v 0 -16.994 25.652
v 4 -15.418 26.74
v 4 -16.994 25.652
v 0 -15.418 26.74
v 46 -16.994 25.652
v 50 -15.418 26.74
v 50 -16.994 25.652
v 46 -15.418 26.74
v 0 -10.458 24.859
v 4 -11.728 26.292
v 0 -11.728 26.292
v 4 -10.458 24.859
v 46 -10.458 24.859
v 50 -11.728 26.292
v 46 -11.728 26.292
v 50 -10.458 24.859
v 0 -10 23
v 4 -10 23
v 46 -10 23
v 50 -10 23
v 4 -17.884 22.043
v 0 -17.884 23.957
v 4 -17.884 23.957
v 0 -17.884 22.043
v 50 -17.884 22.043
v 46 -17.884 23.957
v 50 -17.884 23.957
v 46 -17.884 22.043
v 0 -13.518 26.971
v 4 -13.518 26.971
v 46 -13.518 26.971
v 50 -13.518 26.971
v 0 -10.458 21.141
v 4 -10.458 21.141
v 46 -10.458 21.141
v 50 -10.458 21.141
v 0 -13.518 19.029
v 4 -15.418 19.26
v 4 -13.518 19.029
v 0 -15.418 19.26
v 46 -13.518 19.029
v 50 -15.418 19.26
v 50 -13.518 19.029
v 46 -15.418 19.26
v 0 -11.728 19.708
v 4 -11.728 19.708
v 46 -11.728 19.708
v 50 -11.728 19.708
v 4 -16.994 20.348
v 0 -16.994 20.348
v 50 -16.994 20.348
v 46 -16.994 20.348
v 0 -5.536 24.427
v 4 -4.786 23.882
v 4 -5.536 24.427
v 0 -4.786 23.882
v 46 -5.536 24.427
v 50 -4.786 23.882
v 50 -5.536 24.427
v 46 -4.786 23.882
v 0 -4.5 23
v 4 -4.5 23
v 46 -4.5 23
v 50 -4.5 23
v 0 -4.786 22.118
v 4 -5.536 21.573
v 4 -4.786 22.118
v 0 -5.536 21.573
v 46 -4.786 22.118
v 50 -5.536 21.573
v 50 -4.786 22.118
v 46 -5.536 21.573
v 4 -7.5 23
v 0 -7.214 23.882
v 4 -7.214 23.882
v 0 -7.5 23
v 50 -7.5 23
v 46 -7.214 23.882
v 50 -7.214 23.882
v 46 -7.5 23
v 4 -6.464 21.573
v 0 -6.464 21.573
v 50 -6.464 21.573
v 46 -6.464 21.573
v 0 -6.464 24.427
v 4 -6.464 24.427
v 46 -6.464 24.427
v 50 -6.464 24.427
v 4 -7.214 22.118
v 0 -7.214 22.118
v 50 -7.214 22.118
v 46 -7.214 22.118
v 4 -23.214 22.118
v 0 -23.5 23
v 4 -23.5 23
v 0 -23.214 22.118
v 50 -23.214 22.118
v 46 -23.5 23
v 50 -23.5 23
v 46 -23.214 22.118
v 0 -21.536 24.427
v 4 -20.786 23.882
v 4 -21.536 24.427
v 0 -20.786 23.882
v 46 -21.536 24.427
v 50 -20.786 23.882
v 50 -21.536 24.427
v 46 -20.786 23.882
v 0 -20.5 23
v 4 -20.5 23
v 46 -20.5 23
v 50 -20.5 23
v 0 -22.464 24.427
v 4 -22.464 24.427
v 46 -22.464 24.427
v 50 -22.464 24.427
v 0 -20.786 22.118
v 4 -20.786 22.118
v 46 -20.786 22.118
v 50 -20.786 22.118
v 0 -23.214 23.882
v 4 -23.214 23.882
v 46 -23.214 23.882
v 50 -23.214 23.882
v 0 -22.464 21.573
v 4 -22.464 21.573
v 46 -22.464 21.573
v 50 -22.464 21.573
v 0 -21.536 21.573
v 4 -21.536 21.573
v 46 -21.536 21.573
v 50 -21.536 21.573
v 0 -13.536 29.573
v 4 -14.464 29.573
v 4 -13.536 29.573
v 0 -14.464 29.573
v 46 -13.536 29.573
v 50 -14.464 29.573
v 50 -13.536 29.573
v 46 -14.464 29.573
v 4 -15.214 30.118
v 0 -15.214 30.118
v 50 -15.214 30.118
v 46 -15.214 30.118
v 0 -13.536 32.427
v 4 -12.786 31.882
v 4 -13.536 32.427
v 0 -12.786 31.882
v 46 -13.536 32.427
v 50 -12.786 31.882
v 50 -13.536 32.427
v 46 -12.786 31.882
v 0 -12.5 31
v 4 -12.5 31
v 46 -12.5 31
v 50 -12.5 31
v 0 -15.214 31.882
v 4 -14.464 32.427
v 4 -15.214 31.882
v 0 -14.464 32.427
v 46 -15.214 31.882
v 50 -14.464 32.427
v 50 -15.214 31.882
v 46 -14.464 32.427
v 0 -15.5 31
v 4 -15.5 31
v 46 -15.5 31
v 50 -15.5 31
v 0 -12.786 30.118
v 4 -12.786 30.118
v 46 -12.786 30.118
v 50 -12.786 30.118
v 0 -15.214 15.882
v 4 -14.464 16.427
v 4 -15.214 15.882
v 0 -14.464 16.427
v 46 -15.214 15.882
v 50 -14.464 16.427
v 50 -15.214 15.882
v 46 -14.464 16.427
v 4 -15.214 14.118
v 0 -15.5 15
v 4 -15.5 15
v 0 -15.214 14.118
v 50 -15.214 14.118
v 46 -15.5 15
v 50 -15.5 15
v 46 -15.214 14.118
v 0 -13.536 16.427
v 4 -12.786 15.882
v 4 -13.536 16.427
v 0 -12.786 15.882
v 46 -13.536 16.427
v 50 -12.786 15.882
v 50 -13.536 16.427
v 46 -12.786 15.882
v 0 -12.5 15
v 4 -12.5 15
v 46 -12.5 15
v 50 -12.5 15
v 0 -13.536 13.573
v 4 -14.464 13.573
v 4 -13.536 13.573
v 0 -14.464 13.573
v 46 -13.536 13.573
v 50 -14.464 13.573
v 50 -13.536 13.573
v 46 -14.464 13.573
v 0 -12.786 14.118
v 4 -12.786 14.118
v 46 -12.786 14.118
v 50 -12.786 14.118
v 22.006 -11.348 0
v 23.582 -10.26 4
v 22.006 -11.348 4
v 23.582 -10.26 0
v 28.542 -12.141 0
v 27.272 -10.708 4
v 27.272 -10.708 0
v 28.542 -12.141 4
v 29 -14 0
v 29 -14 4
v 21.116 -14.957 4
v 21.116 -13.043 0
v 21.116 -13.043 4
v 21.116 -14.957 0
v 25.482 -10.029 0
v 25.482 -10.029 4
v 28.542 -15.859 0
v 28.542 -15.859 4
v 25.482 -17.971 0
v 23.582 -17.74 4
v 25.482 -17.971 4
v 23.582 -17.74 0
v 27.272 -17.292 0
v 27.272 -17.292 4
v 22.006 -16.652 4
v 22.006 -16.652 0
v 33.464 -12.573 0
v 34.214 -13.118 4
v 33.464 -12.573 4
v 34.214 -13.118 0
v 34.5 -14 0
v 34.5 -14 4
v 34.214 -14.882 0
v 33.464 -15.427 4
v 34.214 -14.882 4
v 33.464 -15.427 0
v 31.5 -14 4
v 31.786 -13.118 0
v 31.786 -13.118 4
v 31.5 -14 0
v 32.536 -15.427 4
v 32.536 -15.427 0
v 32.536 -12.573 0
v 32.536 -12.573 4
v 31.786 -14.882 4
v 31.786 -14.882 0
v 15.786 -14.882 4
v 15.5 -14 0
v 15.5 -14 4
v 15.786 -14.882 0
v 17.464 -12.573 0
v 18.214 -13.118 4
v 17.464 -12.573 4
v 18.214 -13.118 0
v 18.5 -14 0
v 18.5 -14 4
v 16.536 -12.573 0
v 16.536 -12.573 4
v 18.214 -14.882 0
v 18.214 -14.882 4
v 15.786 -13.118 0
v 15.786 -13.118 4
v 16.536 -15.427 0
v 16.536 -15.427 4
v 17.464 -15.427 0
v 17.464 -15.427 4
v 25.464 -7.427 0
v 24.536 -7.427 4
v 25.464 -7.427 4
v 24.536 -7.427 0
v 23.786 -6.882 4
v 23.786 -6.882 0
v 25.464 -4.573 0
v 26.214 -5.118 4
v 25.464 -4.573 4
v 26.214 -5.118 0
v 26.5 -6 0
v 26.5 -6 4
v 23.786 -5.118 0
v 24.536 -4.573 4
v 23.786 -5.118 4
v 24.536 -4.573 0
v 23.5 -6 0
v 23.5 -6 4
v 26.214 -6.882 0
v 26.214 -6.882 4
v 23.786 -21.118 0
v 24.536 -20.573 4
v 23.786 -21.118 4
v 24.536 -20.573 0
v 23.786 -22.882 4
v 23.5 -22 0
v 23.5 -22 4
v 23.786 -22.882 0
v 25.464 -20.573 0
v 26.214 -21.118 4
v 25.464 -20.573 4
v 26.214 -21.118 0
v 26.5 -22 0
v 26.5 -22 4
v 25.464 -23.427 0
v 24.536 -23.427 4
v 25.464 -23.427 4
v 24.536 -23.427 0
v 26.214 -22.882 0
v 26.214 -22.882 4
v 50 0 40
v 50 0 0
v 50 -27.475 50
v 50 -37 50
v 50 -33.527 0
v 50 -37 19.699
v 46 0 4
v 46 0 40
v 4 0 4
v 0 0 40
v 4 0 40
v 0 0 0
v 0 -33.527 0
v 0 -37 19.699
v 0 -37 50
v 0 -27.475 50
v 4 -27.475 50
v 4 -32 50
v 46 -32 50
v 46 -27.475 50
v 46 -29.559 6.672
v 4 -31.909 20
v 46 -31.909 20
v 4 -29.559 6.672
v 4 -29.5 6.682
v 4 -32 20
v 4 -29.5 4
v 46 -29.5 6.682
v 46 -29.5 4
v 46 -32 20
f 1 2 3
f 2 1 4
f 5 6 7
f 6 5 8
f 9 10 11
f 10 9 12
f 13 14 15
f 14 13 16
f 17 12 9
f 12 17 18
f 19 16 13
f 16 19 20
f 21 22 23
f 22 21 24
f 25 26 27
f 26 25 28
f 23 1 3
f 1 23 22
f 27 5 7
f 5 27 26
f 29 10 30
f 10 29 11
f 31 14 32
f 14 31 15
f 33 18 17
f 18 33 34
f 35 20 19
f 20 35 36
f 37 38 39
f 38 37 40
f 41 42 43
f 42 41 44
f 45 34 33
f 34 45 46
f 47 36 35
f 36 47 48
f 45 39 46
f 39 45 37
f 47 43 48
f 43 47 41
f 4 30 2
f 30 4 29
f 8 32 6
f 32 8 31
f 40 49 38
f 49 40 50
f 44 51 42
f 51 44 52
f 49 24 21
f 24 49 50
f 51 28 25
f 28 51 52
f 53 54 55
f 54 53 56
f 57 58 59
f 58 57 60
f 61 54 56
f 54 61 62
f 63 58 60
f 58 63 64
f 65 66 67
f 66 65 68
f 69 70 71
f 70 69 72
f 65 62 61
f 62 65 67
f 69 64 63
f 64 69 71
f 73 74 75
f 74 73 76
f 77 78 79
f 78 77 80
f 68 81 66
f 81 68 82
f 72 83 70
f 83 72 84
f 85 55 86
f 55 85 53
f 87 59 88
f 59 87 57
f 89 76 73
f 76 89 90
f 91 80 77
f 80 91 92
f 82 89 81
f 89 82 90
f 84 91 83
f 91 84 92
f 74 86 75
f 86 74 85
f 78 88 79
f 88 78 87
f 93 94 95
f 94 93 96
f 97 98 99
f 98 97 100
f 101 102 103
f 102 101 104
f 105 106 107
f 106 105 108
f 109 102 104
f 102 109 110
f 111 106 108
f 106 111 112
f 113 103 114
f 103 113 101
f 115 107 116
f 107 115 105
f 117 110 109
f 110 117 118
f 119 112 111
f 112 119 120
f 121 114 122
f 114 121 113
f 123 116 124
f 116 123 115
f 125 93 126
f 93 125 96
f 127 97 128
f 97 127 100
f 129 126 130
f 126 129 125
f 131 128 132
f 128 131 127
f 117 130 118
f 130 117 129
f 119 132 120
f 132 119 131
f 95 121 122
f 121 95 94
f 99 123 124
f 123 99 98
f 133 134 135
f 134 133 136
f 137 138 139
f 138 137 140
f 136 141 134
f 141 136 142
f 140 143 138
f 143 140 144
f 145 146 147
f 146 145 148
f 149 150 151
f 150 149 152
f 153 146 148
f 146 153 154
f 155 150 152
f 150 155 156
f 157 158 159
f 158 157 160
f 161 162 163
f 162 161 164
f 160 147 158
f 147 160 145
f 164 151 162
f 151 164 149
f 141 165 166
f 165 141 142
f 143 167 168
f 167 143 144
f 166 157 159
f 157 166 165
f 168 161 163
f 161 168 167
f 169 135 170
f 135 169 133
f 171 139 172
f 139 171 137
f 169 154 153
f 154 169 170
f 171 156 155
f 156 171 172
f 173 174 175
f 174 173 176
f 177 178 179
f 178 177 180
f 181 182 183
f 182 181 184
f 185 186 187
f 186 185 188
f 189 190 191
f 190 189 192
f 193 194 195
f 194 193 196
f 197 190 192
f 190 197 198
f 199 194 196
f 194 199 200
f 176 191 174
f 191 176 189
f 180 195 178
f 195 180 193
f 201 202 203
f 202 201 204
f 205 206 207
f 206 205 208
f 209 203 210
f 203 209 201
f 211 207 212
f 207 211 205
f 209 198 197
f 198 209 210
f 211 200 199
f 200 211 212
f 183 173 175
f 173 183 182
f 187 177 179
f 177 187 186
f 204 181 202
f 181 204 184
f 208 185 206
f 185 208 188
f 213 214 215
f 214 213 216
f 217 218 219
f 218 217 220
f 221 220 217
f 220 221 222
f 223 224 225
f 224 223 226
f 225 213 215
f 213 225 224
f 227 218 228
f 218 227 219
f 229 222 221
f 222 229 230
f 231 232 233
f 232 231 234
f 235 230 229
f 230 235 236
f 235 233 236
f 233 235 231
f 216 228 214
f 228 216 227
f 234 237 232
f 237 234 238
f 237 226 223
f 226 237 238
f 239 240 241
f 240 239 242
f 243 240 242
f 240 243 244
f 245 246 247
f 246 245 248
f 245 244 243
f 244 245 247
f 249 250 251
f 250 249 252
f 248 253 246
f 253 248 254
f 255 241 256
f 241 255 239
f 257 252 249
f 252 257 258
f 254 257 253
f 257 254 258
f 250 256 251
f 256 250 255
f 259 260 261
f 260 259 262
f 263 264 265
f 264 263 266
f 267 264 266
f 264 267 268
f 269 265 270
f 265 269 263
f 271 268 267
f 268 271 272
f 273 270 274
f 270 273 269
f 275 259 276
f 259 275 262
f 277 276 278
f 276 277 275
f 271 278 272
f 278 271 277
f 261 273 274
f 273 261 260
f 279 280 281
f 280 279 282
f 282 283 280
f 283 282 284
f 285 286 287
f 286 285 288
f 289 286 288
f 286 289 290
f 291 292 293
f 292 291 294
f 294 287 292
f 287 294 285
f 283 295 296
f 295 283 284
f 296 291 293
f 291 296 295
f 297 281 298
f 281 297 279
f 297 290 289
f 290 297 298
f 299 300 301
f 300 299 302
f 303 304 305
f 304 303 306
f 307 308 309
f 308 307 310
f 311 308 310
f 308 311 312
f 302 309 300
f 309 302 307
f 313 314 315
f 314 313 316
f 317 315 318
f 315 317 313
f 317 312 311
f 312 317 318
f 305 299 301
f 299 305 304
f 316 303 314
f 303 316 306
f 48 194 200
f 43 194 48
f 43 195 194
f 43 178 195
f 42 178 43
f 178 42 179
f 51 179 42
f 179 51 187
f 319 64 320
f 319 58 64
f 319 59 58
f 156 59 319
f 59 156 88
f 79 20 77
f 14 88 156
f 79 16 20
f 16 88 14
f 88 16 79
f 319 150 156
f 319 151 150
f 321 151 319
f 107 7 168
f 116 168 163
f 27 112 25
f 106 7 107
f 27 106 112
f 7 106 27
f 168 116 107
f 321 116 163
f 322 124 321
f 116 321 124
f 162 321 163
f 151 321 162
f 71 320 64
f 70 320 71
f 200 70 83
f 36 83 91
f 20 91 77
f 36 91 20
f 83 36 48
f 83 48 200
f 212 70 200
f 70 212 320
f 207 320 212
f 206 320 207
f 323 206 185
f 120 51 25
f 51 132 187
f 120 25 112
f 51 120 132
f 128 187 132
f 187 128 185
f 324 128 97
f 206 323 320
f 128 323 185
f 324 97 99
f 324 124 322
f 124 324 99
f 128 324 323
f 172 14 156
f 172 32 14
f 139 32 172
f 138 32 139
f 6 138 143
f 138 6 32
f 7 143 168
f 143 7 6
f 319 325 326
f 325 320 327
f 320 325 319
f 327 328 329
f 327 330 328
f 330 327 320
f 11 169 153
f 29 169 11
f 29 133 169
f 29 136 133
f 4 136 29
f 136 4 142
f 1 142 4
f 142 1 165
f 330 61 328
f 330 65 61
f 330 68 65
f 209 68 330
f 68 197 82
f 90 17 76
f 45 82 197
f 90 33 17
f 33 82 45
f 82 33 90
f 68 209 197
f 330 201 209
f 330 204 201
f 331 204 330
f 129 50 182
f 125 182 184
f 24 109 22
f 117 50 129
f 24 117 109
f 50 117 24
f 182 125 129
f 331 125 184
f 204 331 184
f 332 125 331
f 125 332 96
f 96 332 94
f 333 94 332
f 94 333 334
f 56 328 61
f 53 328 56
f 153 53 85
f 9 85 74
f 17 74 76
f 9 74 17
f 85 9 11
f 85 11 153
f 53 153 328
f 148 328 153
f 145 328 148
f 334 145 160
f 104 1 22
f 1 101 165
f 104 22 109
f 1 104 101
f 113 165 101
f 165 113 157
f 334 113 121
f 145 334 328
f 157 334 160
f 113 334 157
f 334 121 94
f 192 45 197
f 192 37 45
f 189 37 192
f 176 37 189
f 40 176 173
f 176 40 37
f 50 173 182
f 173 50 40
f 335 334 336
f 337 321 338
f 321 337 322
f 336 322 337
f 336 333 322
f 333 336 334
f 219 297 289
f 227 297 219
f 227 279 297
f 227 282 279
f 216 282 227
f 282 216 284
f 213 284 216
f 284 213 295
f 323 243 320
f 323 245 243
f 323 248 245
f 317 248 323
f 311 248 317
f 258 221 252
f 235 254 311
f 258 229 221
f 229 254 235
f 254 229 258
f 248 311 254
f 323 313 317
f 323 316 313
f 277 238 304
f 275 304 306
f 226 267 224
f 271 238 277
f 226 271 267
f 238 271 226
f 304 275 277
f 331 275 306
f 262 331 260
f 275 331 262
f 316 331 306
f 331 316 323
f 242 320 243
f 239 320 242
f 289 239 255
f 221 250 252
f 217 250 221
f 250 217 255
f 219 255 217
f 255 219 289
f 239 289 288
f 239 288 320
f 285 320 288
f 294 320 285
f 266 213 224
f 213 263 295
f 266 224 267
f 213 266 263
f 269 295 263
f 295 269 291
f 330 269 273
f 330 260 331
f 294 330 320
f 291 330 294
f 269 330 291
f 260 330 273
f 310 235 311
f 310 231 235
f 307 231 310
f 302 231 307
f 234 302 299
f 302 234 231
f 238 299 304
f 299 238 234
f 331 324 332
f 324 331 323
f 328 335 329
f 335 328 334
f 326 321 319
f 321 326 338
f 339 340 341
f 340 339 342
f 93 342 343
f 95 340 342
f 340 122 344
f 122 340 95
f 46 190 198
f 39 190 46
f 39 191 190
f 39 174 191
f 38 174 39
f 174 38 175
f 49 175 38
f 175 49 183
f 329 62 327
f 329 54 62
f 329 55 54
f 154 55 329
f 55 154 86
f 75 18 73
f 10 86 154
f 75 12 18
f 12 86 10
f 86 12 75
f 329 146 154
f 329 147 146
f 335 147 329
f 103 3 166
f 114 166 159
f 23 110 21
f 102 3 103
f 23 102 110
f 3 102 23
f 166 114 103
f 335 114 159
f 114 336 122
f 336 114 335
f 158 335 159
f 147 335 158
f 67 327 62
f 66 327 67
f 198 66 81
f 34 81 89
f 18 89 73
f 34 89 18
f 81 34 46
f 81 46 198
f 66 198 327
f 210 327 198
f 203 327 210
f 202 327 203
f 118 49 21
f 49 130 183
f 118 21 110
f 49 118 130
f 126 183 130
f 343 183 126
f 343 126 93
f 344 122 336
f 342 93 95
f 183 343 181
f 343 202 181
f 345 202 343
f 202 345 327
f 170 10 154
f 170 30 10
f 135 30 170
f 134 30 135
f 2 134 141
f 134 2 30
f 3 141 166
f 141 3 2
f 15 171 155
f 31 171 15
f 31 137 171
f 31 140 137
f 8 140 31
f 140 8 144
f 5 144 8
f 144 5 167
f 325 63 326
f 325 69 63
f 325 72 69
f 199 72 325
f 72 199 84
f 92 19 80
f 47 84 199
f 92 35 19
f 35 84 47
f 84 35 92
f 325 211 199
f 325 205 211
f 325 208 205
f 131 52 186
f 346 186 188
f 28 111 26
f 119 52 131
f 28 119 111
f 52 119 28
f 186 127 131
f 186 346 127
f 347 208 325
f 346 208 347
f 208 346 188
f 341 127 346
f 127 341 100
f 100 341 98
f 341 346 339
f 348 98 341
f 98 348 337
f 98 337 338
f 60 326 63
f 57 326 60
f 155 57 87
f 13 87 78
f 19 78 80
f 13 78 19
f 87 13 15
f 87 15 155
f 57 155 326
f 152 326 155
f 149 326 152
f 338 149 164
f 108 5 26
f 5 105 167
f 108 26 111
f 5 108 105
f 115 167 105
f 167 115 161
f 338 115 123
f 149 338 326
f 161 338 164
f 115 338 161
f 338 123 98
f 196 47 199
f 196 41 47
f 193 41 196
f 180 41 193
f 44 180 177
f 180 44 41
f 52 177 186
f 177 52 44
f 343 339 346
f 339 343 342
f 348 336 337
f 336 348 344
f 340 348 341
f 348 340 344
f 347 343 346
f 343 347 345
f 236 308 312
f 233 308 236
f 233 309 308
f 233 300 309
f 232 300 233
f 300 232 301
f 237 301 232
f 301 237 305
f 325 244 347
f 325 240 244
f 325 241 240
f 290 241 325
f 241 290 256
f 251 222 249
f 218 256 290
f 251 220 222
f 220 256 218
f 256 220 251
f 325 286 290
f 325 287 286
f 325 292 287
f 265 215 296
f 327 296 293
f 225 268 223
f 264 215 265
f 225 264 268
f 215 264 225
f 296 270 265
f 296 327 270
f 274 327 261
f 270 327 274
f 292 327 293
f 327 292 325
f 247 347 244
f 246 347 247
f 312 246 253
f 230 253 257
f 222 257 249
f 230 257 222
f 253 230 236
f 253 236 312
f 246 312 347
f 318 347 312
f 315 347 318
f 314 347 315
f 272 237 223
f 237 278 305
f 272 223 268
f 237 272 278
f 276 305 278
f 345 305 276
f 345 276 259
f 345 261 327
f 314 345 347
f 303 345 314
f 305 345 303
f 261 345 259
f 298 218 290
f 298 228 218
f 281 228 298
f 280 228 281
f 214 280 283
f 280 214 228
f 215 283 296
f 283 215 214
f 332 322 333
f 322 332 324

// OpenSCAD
module cruz(H){
	d=8;
	union(){
		cylinder(r=4,h=H);
		translate([+d,0,0]) cylinder(r=1.5,h=H,$fn=10);
		translate([-d,0,0]) cylinder(r=1.5,h=H,$fn=10);
		translate([0,+d,0]) cylinder(r=1.5,h=H,$fn=10);
		translate([0,-d,0]) cylinder(r=1.5,h=H,$fn=10);
	}
}

rotate([90,0,0])difference(){
	cube([50,50,50]);
	translate([-5,23,14])rotate([0,90,0])cruz(60);
	translate([25,-5,14])rotate([-90,0,0])cruz(60);
	translate([-1,-20,30])rotate([10,0,0])cube(70);
	translate([-1,40,0])rotate([-20,0,0])cube(70);
	translate([4,14,-12])rotate([10,0,0])cube([42,14,42.2]);
	translate([4,20,-10])rotate([0,0,0])cube([42,46,42]);
	translate([4,4,-15])cube([42,42,44.5]);
	translate([-5,-5,37])cube(60);
}
